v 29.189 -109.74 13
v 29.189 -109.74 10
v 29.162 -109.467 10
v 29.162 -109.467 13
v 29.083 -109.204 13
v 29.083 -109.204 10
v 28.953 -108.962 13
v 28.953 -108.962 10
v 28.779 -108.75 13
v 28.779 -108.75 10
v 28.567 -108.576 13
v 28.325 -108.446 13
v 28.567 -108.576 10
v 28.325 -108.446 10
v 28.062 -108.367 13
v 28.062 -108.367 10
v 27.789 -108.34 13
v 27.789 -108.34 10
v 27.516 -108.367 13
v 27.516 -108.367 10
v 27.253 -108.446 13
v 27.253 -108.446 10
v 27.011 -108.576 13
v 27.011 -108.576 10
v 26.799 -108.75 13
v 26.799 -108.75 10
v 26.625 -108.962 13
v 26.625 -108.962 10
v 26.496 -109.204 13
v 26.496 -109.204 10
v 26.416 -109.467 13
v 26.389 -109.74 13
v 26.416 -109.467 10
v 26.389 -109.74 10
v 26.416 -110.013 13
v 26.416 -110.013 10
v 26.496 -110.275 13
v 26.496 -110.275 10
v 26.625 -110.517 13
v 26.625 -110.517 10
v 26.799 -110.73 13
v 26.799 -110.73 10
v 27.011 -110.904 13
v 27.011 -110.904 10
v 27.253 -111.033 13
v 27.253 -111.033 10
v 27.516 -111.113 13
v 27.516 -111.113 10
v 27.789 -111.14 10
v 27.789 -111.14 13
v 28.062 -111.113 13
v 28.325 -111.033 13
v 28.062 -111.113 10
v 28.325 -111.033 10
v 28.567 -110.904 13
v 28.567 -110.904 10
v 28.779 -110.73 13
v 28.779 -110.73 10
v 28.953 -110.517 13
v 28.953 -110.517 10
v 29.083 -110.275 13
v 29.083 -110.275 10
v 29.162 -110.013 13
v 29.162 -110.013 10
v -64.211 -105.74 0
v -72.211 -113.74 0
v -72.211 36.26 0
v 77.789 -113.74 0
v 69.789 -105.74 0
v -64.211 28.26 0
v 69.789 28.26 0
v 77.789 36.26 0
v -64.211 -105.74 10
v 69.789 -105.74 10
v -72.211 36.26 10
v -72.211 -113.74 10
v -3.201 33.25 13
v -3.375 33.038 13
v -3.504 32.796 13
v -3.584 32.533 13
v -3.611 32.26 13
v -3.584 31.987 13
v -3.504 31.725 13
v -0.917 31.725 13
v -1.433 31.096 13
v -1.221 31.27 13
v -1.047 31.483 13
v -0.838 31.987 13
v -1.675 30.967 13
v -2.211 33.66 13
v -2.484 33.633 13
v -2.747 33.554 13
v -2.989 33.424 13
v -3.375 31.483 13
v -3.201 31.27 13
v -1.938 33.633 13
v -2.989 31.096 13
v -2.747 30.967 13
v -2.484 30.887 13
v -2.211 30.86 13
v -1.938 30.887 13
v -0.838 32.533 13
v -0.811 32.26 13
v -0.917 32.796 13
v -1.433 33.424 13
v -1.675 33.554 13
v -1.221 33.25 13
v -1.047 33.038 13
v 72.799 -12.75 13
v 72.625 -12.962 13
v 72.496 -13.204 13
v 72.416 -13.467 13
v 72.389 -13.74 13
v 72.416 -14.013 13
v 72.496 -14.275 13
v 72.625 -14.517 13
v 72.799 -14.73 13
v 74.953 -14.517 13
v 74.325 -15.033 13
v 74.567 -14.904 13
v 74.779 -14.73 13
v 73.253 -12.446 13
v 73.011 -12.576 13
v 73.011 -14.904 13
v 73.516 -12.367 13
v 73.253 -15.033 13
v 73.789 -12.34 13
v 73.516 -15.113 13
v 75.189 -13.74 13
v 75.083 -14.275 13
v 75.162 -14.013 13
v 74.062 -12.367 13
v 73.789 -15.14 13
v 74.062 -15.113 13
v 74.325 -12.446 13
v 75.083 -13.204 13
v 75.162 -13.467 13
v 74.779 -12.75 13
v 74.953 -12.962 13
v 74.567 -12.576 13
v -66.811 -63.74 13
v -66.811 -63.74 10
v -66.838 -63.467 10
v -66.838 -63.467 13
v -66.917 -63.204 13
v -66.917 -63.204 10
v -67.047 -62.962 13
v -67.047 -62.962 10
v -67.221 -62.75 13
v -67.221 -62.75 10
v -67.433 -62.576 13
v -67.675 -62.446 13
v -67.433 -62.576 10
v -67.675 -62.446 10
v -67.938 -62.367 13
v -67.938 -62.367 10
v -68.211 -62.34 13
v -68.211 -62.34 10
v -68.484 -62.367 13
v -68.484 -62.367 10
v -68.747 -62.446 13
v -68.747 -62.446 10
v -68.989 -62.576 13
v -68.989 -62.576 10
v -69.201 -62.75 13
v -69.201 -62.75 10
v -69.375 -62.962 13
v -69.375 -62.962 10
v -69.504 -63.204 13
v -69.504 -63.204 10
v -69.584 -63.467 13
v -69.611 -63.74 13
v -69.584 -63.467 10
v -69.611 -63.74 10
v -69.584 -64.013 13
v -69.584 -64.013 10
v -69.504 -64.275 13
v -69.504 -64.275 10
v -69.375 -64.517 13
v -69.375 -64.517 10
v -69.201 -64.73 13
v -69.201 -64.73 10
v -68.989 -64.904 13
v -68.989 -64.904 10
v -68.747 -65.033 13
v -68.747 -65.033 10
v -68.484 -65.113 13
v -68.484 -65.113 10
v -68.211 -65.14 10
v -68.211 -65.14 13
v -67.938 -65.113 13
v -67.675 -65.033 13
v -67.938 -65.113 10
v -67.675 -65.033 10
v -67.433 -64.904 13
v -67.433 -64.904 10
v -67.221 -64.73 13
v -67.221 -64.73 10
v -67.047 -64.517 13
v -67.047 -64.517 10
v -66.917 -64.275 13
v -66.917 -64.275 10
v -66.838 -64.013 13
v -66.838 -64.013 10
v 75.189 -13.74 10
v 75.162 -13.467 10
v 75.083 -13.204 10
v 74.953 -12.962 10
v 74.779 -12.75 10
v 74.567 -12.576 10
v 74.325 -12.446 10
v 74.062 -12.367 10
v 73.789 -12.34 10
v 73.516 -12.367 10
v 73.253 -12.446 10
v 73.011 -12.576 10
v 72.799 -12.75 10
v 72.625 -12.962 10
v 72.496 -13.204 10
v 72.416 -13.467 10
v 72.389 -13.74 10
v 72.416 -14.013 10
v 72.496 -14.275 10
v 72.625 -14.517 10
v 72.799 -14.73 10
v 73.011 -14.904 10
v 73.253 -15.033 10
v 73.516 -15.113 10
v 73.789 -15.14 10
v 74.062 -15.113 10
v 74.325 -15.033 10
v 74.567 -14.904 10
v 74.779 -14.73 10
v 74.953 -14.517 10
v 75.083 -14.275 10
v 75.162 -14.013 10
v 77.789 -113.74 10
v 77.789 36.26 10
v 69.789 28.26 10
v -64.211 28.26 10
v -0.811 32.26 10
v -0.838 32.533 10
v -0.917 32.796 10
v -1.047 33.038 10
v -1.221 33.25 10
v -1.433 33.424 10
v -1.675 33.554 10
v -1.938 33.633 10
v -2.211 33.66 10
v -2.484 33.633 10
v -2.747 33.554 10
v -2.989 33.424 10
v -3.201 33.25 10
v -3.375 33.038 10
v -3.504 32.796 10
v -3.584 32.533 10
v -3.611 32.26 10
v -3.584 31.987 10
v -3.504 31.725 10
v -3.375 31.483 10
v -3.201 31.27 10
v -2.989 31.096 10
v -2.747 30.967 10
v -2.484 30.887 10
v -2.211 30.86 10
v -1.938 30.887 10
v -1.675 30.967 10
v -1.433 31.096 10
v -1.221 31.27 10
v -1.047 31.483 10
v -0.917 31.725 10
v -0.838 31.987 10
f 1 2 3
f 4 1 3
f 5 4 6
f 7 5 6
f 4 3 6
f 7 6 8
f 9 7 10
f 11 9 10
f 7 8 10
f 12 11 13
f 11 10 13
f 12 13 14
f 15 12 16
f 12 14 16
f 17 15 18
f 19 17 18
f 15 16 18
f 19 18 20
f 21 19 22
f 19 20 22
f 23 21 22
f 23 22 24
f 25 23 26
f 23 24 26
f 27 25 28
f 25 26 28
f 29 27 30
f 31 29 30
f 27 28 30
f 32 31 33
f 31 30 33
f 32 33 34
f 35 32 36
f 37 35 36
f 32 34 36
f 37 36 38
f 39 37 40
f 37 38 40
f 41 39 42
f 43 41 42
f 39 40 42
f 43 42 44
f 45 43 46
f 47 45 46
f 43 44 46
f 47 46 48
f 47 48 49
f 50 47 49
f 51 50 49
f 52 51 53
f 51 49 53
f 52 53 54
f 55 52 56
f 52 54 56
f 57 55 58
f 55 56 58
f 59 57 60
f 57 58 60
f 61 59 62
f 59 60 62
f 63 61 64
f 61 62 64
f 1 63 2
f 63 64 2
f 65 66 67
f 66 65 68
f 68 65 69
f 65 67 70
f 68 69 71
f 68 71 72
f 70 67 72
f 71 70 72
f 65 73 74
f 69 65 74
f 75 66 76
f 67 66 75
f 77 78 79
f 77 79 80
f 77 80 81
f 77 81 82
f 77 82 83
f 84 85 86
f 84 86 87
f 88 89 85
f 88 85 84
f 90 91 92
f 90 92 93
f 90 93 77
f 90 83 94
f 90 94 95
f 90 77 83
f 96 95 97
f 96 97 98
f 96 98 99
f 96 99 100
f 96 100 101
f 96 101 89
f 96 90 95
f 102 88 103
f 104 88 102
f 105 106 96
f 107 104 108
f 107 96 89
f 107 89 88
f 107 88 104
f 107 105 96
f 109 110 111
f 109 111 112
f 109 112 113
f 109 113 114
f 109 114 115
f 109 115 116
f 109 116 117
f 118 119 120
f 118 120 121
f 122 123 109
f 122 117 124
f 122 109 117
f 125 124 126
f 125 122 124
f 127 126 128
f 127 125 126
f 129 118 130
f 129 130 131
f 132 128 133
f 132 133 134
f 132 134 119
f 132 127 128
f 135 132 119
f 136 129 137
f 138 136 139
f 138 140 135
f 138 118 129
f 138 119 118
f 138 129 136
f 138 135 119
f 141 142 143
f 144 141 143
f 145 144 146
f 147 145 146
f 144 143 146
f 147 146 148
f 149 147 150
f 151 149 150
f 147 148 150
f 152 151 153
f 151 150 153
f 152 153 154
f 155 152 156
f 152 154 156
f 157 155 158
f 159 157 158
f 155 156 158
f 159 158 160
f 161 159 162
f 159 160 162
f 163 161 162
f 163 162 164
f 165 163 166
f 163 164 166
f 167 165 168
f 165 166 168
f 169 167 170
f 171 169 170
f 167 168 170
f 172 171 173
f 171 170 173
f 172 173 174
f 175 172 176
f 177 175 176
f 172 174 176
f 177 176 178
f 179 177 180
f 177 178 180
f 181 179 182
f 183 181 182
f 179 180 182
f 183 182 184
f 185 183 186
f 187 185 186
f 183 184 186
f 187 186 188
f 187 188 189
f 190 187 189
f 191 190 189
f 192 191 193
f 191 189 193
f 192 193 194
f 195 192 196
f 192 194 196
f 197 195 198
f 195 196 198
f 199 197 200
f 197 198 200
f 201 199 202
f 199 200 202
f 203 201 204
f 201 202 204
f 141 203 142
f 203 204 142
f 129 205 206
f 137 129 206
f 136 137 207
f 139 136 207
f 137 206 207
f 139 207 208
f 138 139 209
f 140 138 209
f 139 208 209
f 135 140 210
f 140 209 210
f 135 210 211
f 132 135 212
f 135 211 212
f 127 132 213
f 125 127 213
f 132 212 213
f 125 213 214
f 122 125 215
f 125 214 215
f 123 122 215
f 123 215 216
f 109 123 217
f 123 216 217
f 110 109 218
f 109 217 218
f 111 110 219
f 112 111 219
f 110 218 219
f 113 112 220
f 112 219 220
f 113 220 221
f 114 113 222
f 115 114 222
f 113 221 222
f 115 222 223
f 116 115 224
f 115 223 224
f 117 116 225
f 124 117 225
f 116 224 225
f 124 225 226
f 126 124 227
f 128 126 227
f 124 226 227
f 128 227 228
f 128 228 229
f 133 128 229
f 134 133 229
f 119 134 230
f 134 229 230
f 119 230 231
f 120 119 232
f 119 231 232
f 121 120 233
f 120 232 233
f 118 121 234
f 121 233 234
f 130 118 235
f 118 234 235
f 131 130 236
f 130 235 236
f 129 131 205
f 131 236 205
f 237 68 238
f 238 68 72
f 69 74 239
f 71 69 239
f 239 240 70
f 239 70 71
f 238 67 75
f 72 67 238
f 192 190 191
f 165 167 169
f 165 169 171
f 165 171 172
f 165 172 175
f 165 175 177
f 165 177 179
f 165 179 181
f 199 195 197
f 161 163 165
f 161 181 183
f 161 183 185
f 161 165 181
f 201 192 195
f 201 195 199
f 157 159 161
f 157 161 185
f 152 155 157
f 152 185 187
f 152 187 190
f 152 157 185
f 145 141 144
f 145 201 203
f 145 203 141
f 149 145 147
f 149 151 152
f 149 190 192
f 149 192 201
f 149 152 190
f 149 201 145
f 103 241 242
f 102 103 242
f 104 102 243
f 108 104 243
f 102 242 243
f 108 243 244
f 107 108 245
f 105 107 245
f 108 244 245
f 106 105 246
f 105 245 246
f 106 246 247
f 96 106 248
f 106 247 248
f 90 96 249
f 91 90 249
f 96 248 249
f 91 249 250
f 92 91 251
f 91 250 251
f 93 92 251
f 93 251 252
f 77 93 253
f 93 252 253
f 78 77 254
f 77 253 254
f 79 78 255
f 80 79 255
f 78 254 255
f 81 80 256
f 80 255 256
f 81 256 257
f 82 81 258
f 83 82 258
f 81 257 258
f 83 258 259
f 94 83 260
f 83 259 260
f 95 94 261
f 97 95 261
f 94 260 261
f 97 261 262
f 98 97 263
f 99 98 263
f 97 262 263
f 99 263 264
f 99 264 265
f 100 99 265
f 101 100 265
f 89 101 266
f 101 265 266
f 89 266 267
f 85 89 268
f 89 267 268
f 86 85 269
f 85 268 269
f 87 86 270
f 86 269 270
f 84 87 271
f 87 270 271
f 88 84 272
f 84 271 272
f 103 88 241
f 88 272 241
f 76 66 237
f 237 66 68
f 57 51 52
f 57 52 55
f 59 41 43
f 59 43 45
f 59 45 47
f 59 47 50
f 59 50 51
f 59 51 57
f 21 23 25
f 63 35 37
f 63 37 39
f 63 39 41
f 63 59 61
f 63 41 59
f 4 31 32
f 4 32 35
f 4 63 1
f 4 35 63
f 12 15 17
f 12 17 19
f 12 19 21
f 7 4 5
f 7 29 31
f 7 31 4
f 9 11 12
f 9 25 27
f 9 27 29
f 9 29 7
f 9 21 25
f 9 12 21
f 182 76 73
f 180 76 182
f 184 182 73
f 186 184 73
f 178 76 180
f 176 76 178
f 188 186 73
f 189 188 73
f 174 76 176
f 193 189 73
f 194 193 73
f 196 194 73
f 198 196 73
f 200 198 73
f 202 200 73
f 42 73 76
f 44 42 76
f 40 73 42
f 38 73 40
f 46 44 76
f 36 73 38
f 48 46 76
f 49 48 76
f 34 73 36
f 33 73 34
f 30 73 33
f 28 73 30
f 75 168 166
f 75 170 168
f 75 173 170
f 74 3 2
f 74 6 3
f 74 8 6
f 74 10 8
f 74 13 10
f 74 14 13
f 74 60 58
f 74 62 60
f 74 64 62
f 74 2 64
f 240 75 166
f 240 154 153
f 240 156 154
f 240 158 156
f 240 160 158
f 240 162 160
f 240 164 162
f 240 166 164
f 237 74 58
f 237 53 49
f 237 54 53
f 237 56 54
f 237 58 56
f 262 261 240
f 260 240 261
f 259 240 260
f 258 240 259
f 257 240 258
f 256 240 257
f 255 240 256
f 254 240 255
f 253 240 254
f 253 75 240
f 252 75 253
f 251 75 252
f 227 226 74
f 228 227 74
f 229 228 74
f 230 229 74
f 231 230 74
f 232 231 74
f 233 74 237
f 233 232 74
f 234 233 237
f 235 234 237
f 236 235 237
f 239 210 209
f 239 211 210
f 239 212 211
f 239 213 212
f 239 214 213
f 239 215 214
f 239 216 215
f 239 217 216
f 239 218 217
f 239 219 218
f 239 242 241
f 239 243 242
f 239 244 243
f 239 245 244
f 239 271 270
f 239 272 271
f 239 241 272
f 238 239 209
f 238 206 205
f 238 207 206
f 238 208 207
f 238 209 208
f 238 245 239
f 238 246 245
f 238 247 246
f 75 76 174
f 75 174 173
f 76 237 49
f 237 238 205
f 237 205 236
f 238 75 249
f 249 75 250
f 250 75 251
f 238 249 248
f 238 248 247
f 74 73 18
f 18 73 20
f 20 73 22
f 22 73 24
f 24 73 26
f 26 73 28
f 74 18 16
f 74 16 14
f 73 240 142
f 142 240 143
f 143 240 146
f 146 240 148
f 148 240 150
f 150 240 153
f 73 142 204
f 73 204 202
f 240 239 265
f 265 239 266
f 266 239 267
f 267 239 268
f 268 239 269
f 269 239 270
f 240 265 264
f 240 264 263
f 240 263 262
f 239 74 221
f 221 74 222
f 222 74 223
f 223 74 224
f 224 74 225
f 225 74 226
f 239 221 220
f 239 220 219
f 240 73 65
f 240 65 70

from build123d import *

# Parameters (mm, degrees)
SKETCH1_W           = 150
SKETCH1_H           = 150
BOSS_EXTRUDE1_DEPTH = 10
SKETCH2_W           = 134
SKETCH2_H           = 134
CUT_EXTRUDE1_DEPTH  = 139.158896854
SKETCH3_R           = 1.4
BOSS_EXTRUDE2_DEPTH = 3


with BuildPart() as part:
    # Sketch1 → Boss-Extrude1 (new body)
    with BuildSketch(Plane.XY):
        with Locations((2.789256198, -38.739669421)):
            Rectangle(SKETCH1_W, SKETCH1_H)
    extrude(amount=BOSS_EXTRUDE1_DEPTH)

    # Sketch2 → Cut-Extrude1 (cut, through all)
    with BuildSketch(Plane.XY.offset(10)):
        with Locations((2.789256198, -38.739669421)):
            Rectangle(SKETCH2_W, SKETCH2_H)
    extrude(amount=-CUT_EXTRUDE1_DEPTH, mode=Mode.SUBTRACT)

    # Sketch3 → Boss-Extrude2 (add)
    with BuildSketch(Plane.XY.offset(10)):
        with Locations((73.789256198, -13.739669421)):
            Circle(SKETCH3_R)
        with Locations((27.789256198, -109.739669421)):
            Circle(SKETCH3_R)
        with Locations((-68.210743802, -63.739669421)):
            Circle(SKETCH3_R)
        with Locations((-2.210743802, 32.260330579)):
            Circle(SKETCH3_R)
    extrude(amount=BOSS_EXTRUDE2_DEPTH)


solid = part.part
